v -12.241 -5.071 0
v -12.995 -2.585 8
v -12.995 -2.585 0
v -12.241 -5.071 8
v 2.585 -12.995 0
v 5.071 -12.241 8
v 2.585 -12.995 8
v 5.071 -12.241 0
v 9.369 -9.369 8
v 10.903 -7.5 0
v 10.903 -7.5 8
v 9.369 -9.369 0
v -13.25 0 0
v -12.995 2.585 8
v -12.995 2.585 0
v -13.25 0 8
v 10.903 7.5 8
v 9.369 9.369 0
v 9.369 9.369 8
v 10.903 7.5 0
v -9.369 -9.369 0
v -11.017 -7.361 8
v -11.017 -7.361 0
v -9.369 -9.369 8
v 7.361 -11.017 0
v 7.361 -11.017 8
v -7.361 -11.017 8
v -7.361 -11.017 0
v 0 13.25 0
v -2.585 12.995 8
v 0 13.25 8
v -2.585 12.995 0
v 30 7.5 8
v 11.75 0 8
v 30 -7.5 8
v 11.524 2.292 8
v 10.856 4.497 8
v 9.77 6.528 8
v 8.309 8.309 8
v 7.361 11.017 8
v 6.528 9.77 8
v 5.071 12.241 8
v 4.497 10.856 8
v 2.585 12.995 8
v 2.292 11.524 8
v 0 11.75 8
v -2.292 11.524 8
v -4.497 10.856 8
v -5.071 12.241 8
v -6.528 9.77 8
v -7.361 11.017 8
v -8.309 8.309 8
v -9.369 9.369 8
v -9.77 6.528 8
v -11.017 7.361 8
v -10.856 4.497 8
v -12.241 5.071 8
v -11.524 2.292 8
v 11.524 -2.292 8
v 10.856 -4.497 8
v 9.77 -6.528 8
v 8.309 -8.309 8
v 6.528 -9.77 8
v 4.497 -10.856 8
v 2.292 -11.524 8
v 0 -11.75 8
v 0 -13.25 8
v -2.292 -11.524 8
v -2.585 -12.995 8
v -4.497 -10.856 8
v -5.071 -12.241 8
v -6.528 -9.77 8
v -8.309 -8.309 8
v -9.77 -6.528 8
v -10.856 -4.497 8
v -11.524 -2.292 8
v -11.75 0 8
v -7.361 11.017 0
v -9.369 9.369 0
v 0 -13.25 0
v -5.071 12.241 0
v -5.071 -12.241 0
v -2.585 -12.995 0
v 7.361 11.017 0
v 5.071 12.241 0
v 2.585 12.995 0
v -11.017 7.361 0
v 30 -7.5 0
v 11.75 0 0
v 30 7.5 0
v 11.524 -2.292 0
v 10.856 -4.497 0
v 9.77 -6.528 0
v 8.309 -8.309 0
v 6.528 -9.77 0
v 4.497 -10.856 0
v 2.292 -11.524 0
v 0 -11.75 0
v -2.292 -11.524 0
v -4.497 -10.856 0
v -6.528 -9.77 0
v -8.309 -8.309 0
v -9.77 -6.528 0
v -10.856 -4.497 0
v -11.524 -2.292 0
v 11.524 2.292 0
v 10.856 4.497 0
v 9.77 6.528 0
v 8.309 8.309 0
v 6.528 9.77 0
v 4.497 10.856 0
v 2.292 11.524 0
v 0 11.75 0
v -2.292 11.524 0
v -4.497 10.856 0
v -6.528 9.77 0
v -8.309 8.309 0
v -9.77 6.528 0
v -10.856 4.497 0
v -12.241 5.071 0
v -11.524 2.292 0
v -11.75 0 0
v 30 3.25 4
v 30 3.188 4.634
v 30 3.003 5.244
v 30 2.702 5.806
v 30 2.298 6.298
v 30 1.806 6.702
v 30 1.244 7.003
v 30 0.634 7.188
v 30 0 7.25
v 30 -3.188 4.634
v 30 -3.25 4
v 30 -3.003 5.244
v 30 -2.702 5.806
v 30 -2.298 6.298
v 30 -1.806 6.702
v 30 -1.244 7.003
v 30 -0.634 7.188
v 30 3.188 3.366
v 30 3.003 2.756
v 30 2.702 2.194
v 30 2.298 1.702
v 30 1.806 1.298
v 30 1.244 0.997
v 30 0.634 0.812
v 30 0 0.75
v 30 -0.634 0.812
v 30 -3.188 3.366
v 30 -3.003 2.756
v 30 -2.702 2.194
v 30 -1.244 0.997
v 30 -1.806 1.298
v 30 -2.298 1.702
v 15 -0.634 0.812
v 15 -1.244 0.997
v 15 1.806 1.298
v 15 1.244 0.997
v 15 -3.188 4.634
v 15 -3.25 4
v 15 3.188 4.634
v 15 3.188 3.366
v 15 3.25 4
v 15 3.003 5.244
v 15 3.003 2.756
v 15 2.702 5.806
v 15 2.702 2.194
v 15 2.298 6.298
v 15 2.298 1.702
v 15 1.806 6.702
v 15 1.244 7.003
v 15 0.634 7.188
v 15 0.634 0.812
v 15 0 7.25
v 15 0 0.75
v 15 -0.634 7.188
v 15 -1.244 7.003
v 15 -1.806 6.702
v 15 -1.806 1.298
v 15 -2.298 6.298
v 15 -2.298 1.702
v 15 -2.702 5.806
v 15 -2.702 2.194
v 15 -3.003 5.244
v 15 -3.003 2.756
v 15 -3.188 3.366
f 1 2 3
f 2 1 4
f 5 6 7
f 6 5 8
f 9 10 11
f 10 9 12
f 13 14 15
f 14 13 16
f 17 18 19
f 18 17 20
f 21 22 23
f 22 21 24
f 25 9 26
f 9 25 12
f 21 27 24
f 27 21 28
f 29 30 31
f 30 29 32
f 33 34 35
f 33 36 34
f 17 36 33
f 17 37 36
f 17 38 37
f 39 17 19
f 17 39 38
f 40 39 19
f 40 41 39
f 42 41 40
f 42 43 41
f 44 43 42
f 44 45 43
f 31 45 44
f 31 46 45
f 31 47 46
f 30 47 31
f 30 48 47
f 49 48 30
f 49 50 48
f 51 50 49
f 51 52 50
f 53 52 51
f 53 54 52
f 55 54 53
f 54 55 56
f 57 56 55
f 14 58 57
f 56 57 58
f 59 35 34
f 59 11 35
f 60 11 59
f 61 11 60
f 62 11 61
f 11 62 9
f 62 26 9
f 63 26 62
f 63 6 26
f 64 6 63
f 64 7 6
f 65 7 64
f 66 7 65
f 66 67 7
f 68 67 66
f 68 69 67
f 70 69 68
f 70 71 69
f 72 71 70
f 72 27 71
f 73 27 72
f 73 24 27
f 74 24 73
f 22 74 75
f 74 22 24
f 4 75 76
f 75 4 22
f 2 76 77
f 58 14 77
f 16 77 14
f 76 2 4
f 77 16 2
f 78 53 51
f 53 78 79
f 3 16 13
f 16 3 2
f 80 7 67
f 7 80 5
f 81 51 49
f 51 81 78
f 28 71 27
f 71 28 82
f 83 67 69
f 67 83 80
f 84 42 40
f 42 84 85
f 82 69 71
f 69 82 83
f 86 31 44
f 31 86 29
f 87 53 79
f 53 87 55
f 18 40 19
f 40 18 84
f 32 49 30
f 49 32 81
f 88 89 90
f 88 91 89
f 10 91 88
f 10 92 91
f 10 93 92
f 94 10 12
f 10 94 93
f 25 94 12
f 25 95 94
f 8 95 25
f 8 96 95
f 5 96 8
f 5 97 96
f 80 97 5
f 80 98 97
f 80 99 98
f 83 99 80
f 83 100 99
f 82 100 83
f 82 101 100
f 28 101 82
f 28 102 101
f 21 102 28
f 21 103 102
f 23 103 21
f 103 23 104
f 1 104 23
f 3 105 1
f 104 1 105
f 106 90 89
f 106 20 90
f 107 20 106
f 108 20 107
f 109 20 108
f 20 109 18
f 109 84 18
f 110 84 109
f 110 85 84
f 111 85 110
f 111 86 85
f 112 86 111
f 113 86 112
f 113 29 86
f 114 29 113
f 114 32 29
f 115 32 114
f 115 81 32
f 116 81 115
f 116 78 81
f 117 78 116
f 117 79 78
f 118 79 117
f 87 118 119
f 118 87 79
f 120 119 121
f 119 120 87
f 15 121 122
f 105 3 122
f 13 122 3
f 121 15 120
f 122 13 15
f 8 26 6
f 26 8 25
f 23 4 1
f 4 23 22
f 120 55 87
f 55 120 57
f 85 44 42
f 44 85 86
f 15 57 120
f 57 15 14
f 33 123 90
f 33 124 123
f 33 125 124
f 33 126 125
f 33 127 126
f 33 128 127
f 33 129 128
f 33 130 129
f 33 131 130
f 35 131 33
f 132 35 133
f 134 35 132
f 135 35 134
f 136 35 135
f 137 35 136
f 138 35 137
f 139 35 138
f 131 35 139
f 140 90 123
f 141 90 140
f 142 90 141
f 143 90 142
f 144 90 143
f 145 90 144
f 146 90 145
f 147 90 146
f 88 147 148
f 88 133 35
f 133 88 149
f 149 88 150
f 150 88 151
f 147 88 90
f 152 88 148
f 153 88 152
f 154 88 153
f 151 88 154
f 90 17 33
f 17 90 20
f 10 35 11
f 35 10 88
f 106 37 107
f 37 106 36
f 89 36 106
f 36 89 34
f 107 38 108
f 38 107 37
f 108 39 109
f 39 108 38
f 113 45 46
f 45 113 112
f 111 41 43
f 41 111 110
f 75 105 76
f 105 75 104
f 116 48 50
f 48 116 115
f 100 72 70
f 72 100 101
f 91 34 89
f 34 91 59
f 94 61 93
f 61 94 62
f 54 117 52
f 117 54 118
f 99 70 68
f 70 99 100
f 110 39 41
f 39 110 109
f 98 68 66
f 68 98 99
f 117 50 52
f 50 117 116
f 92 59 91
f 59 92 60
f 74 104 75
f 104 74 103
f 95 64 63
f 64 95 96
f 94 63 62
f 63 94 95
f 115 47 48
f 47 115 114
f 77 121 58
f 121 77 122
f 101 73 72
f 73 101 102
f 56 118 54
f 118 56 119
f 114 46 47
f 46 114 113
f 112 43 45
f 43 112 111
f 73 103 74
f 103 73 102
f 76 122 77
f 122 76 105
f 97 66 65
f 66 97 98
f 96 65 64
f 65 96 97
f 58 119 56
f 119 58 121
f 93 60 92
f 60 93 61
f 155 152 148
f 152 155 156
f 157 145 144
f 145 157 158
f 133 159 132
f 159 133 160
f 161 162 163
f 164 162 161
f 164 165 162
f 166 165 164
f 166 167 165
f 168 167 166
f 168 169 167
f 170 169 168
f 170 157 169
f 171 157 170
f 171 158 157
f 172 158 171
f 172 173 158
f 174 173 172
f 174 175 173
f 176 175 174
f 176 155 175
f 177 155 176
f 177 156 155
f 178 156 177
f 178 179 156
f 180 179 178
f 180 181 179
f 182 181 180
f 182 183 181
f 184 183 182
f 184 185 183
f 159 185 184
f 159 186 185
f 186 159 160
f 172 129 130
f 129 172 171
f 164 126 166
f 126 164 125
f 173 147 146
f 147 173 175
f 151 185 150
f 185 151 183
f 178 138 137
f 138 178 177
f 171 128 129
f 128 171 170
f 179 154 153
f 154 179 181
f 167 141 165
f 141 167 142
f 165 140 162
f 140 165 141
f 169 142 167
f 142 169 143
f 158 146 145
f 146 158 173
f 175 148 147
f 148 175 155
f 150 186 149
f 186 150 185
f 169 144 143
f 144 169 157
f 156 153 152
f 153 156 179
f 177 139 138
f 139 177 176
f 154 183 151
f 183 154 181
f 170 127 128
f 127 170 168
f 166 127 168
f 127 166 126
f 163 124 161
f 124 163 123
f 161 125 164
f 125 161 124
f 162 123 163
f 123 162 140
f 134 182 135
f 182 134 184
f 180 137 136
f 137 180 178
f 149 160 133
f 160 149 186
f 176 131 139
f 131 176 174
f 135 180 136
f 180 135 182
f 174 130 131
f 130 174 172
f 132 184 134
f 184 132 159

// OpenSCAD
fn = 32;
thickness = 2;
expansion_fudge = 0.5;
// looseness will allow the shaft to rotate freely
looseness = 0.5;

collar_height = 8;
collar_radius = 22.5 / 2.0;
rod_radius = (6 + expansion_fudge) / 2.0;
horz_length = 30;
horz_rod_depth = 15;
horz_width = 15;

module render()
{
  difference() {
    union() {
      cylinder(h = collar_height,
               r1 = collar_radius + thickness,
               r2 = collar_radius + thickness, $fn=fn);
      translate([0, -horz_width/2, 0])
      cube(size = [horz_length, horz_width, collar_height]);
    }
    cylinder(h = collar_height,
             r1 = collar_radius + looseness,
             r2 = collar_radius + looseness, $fn=fn);
    rotate(a=90, v=[0,1,0])
    translate([-collar_height/2.0, 0,
               horz_length-horz_rod_depth])
    cylinder(h = horz_rod_depth,
             r1 = rod_radius,
             r2 = rod_radius, $fn=fn);    
  }
}

echo(version=version());

render();
